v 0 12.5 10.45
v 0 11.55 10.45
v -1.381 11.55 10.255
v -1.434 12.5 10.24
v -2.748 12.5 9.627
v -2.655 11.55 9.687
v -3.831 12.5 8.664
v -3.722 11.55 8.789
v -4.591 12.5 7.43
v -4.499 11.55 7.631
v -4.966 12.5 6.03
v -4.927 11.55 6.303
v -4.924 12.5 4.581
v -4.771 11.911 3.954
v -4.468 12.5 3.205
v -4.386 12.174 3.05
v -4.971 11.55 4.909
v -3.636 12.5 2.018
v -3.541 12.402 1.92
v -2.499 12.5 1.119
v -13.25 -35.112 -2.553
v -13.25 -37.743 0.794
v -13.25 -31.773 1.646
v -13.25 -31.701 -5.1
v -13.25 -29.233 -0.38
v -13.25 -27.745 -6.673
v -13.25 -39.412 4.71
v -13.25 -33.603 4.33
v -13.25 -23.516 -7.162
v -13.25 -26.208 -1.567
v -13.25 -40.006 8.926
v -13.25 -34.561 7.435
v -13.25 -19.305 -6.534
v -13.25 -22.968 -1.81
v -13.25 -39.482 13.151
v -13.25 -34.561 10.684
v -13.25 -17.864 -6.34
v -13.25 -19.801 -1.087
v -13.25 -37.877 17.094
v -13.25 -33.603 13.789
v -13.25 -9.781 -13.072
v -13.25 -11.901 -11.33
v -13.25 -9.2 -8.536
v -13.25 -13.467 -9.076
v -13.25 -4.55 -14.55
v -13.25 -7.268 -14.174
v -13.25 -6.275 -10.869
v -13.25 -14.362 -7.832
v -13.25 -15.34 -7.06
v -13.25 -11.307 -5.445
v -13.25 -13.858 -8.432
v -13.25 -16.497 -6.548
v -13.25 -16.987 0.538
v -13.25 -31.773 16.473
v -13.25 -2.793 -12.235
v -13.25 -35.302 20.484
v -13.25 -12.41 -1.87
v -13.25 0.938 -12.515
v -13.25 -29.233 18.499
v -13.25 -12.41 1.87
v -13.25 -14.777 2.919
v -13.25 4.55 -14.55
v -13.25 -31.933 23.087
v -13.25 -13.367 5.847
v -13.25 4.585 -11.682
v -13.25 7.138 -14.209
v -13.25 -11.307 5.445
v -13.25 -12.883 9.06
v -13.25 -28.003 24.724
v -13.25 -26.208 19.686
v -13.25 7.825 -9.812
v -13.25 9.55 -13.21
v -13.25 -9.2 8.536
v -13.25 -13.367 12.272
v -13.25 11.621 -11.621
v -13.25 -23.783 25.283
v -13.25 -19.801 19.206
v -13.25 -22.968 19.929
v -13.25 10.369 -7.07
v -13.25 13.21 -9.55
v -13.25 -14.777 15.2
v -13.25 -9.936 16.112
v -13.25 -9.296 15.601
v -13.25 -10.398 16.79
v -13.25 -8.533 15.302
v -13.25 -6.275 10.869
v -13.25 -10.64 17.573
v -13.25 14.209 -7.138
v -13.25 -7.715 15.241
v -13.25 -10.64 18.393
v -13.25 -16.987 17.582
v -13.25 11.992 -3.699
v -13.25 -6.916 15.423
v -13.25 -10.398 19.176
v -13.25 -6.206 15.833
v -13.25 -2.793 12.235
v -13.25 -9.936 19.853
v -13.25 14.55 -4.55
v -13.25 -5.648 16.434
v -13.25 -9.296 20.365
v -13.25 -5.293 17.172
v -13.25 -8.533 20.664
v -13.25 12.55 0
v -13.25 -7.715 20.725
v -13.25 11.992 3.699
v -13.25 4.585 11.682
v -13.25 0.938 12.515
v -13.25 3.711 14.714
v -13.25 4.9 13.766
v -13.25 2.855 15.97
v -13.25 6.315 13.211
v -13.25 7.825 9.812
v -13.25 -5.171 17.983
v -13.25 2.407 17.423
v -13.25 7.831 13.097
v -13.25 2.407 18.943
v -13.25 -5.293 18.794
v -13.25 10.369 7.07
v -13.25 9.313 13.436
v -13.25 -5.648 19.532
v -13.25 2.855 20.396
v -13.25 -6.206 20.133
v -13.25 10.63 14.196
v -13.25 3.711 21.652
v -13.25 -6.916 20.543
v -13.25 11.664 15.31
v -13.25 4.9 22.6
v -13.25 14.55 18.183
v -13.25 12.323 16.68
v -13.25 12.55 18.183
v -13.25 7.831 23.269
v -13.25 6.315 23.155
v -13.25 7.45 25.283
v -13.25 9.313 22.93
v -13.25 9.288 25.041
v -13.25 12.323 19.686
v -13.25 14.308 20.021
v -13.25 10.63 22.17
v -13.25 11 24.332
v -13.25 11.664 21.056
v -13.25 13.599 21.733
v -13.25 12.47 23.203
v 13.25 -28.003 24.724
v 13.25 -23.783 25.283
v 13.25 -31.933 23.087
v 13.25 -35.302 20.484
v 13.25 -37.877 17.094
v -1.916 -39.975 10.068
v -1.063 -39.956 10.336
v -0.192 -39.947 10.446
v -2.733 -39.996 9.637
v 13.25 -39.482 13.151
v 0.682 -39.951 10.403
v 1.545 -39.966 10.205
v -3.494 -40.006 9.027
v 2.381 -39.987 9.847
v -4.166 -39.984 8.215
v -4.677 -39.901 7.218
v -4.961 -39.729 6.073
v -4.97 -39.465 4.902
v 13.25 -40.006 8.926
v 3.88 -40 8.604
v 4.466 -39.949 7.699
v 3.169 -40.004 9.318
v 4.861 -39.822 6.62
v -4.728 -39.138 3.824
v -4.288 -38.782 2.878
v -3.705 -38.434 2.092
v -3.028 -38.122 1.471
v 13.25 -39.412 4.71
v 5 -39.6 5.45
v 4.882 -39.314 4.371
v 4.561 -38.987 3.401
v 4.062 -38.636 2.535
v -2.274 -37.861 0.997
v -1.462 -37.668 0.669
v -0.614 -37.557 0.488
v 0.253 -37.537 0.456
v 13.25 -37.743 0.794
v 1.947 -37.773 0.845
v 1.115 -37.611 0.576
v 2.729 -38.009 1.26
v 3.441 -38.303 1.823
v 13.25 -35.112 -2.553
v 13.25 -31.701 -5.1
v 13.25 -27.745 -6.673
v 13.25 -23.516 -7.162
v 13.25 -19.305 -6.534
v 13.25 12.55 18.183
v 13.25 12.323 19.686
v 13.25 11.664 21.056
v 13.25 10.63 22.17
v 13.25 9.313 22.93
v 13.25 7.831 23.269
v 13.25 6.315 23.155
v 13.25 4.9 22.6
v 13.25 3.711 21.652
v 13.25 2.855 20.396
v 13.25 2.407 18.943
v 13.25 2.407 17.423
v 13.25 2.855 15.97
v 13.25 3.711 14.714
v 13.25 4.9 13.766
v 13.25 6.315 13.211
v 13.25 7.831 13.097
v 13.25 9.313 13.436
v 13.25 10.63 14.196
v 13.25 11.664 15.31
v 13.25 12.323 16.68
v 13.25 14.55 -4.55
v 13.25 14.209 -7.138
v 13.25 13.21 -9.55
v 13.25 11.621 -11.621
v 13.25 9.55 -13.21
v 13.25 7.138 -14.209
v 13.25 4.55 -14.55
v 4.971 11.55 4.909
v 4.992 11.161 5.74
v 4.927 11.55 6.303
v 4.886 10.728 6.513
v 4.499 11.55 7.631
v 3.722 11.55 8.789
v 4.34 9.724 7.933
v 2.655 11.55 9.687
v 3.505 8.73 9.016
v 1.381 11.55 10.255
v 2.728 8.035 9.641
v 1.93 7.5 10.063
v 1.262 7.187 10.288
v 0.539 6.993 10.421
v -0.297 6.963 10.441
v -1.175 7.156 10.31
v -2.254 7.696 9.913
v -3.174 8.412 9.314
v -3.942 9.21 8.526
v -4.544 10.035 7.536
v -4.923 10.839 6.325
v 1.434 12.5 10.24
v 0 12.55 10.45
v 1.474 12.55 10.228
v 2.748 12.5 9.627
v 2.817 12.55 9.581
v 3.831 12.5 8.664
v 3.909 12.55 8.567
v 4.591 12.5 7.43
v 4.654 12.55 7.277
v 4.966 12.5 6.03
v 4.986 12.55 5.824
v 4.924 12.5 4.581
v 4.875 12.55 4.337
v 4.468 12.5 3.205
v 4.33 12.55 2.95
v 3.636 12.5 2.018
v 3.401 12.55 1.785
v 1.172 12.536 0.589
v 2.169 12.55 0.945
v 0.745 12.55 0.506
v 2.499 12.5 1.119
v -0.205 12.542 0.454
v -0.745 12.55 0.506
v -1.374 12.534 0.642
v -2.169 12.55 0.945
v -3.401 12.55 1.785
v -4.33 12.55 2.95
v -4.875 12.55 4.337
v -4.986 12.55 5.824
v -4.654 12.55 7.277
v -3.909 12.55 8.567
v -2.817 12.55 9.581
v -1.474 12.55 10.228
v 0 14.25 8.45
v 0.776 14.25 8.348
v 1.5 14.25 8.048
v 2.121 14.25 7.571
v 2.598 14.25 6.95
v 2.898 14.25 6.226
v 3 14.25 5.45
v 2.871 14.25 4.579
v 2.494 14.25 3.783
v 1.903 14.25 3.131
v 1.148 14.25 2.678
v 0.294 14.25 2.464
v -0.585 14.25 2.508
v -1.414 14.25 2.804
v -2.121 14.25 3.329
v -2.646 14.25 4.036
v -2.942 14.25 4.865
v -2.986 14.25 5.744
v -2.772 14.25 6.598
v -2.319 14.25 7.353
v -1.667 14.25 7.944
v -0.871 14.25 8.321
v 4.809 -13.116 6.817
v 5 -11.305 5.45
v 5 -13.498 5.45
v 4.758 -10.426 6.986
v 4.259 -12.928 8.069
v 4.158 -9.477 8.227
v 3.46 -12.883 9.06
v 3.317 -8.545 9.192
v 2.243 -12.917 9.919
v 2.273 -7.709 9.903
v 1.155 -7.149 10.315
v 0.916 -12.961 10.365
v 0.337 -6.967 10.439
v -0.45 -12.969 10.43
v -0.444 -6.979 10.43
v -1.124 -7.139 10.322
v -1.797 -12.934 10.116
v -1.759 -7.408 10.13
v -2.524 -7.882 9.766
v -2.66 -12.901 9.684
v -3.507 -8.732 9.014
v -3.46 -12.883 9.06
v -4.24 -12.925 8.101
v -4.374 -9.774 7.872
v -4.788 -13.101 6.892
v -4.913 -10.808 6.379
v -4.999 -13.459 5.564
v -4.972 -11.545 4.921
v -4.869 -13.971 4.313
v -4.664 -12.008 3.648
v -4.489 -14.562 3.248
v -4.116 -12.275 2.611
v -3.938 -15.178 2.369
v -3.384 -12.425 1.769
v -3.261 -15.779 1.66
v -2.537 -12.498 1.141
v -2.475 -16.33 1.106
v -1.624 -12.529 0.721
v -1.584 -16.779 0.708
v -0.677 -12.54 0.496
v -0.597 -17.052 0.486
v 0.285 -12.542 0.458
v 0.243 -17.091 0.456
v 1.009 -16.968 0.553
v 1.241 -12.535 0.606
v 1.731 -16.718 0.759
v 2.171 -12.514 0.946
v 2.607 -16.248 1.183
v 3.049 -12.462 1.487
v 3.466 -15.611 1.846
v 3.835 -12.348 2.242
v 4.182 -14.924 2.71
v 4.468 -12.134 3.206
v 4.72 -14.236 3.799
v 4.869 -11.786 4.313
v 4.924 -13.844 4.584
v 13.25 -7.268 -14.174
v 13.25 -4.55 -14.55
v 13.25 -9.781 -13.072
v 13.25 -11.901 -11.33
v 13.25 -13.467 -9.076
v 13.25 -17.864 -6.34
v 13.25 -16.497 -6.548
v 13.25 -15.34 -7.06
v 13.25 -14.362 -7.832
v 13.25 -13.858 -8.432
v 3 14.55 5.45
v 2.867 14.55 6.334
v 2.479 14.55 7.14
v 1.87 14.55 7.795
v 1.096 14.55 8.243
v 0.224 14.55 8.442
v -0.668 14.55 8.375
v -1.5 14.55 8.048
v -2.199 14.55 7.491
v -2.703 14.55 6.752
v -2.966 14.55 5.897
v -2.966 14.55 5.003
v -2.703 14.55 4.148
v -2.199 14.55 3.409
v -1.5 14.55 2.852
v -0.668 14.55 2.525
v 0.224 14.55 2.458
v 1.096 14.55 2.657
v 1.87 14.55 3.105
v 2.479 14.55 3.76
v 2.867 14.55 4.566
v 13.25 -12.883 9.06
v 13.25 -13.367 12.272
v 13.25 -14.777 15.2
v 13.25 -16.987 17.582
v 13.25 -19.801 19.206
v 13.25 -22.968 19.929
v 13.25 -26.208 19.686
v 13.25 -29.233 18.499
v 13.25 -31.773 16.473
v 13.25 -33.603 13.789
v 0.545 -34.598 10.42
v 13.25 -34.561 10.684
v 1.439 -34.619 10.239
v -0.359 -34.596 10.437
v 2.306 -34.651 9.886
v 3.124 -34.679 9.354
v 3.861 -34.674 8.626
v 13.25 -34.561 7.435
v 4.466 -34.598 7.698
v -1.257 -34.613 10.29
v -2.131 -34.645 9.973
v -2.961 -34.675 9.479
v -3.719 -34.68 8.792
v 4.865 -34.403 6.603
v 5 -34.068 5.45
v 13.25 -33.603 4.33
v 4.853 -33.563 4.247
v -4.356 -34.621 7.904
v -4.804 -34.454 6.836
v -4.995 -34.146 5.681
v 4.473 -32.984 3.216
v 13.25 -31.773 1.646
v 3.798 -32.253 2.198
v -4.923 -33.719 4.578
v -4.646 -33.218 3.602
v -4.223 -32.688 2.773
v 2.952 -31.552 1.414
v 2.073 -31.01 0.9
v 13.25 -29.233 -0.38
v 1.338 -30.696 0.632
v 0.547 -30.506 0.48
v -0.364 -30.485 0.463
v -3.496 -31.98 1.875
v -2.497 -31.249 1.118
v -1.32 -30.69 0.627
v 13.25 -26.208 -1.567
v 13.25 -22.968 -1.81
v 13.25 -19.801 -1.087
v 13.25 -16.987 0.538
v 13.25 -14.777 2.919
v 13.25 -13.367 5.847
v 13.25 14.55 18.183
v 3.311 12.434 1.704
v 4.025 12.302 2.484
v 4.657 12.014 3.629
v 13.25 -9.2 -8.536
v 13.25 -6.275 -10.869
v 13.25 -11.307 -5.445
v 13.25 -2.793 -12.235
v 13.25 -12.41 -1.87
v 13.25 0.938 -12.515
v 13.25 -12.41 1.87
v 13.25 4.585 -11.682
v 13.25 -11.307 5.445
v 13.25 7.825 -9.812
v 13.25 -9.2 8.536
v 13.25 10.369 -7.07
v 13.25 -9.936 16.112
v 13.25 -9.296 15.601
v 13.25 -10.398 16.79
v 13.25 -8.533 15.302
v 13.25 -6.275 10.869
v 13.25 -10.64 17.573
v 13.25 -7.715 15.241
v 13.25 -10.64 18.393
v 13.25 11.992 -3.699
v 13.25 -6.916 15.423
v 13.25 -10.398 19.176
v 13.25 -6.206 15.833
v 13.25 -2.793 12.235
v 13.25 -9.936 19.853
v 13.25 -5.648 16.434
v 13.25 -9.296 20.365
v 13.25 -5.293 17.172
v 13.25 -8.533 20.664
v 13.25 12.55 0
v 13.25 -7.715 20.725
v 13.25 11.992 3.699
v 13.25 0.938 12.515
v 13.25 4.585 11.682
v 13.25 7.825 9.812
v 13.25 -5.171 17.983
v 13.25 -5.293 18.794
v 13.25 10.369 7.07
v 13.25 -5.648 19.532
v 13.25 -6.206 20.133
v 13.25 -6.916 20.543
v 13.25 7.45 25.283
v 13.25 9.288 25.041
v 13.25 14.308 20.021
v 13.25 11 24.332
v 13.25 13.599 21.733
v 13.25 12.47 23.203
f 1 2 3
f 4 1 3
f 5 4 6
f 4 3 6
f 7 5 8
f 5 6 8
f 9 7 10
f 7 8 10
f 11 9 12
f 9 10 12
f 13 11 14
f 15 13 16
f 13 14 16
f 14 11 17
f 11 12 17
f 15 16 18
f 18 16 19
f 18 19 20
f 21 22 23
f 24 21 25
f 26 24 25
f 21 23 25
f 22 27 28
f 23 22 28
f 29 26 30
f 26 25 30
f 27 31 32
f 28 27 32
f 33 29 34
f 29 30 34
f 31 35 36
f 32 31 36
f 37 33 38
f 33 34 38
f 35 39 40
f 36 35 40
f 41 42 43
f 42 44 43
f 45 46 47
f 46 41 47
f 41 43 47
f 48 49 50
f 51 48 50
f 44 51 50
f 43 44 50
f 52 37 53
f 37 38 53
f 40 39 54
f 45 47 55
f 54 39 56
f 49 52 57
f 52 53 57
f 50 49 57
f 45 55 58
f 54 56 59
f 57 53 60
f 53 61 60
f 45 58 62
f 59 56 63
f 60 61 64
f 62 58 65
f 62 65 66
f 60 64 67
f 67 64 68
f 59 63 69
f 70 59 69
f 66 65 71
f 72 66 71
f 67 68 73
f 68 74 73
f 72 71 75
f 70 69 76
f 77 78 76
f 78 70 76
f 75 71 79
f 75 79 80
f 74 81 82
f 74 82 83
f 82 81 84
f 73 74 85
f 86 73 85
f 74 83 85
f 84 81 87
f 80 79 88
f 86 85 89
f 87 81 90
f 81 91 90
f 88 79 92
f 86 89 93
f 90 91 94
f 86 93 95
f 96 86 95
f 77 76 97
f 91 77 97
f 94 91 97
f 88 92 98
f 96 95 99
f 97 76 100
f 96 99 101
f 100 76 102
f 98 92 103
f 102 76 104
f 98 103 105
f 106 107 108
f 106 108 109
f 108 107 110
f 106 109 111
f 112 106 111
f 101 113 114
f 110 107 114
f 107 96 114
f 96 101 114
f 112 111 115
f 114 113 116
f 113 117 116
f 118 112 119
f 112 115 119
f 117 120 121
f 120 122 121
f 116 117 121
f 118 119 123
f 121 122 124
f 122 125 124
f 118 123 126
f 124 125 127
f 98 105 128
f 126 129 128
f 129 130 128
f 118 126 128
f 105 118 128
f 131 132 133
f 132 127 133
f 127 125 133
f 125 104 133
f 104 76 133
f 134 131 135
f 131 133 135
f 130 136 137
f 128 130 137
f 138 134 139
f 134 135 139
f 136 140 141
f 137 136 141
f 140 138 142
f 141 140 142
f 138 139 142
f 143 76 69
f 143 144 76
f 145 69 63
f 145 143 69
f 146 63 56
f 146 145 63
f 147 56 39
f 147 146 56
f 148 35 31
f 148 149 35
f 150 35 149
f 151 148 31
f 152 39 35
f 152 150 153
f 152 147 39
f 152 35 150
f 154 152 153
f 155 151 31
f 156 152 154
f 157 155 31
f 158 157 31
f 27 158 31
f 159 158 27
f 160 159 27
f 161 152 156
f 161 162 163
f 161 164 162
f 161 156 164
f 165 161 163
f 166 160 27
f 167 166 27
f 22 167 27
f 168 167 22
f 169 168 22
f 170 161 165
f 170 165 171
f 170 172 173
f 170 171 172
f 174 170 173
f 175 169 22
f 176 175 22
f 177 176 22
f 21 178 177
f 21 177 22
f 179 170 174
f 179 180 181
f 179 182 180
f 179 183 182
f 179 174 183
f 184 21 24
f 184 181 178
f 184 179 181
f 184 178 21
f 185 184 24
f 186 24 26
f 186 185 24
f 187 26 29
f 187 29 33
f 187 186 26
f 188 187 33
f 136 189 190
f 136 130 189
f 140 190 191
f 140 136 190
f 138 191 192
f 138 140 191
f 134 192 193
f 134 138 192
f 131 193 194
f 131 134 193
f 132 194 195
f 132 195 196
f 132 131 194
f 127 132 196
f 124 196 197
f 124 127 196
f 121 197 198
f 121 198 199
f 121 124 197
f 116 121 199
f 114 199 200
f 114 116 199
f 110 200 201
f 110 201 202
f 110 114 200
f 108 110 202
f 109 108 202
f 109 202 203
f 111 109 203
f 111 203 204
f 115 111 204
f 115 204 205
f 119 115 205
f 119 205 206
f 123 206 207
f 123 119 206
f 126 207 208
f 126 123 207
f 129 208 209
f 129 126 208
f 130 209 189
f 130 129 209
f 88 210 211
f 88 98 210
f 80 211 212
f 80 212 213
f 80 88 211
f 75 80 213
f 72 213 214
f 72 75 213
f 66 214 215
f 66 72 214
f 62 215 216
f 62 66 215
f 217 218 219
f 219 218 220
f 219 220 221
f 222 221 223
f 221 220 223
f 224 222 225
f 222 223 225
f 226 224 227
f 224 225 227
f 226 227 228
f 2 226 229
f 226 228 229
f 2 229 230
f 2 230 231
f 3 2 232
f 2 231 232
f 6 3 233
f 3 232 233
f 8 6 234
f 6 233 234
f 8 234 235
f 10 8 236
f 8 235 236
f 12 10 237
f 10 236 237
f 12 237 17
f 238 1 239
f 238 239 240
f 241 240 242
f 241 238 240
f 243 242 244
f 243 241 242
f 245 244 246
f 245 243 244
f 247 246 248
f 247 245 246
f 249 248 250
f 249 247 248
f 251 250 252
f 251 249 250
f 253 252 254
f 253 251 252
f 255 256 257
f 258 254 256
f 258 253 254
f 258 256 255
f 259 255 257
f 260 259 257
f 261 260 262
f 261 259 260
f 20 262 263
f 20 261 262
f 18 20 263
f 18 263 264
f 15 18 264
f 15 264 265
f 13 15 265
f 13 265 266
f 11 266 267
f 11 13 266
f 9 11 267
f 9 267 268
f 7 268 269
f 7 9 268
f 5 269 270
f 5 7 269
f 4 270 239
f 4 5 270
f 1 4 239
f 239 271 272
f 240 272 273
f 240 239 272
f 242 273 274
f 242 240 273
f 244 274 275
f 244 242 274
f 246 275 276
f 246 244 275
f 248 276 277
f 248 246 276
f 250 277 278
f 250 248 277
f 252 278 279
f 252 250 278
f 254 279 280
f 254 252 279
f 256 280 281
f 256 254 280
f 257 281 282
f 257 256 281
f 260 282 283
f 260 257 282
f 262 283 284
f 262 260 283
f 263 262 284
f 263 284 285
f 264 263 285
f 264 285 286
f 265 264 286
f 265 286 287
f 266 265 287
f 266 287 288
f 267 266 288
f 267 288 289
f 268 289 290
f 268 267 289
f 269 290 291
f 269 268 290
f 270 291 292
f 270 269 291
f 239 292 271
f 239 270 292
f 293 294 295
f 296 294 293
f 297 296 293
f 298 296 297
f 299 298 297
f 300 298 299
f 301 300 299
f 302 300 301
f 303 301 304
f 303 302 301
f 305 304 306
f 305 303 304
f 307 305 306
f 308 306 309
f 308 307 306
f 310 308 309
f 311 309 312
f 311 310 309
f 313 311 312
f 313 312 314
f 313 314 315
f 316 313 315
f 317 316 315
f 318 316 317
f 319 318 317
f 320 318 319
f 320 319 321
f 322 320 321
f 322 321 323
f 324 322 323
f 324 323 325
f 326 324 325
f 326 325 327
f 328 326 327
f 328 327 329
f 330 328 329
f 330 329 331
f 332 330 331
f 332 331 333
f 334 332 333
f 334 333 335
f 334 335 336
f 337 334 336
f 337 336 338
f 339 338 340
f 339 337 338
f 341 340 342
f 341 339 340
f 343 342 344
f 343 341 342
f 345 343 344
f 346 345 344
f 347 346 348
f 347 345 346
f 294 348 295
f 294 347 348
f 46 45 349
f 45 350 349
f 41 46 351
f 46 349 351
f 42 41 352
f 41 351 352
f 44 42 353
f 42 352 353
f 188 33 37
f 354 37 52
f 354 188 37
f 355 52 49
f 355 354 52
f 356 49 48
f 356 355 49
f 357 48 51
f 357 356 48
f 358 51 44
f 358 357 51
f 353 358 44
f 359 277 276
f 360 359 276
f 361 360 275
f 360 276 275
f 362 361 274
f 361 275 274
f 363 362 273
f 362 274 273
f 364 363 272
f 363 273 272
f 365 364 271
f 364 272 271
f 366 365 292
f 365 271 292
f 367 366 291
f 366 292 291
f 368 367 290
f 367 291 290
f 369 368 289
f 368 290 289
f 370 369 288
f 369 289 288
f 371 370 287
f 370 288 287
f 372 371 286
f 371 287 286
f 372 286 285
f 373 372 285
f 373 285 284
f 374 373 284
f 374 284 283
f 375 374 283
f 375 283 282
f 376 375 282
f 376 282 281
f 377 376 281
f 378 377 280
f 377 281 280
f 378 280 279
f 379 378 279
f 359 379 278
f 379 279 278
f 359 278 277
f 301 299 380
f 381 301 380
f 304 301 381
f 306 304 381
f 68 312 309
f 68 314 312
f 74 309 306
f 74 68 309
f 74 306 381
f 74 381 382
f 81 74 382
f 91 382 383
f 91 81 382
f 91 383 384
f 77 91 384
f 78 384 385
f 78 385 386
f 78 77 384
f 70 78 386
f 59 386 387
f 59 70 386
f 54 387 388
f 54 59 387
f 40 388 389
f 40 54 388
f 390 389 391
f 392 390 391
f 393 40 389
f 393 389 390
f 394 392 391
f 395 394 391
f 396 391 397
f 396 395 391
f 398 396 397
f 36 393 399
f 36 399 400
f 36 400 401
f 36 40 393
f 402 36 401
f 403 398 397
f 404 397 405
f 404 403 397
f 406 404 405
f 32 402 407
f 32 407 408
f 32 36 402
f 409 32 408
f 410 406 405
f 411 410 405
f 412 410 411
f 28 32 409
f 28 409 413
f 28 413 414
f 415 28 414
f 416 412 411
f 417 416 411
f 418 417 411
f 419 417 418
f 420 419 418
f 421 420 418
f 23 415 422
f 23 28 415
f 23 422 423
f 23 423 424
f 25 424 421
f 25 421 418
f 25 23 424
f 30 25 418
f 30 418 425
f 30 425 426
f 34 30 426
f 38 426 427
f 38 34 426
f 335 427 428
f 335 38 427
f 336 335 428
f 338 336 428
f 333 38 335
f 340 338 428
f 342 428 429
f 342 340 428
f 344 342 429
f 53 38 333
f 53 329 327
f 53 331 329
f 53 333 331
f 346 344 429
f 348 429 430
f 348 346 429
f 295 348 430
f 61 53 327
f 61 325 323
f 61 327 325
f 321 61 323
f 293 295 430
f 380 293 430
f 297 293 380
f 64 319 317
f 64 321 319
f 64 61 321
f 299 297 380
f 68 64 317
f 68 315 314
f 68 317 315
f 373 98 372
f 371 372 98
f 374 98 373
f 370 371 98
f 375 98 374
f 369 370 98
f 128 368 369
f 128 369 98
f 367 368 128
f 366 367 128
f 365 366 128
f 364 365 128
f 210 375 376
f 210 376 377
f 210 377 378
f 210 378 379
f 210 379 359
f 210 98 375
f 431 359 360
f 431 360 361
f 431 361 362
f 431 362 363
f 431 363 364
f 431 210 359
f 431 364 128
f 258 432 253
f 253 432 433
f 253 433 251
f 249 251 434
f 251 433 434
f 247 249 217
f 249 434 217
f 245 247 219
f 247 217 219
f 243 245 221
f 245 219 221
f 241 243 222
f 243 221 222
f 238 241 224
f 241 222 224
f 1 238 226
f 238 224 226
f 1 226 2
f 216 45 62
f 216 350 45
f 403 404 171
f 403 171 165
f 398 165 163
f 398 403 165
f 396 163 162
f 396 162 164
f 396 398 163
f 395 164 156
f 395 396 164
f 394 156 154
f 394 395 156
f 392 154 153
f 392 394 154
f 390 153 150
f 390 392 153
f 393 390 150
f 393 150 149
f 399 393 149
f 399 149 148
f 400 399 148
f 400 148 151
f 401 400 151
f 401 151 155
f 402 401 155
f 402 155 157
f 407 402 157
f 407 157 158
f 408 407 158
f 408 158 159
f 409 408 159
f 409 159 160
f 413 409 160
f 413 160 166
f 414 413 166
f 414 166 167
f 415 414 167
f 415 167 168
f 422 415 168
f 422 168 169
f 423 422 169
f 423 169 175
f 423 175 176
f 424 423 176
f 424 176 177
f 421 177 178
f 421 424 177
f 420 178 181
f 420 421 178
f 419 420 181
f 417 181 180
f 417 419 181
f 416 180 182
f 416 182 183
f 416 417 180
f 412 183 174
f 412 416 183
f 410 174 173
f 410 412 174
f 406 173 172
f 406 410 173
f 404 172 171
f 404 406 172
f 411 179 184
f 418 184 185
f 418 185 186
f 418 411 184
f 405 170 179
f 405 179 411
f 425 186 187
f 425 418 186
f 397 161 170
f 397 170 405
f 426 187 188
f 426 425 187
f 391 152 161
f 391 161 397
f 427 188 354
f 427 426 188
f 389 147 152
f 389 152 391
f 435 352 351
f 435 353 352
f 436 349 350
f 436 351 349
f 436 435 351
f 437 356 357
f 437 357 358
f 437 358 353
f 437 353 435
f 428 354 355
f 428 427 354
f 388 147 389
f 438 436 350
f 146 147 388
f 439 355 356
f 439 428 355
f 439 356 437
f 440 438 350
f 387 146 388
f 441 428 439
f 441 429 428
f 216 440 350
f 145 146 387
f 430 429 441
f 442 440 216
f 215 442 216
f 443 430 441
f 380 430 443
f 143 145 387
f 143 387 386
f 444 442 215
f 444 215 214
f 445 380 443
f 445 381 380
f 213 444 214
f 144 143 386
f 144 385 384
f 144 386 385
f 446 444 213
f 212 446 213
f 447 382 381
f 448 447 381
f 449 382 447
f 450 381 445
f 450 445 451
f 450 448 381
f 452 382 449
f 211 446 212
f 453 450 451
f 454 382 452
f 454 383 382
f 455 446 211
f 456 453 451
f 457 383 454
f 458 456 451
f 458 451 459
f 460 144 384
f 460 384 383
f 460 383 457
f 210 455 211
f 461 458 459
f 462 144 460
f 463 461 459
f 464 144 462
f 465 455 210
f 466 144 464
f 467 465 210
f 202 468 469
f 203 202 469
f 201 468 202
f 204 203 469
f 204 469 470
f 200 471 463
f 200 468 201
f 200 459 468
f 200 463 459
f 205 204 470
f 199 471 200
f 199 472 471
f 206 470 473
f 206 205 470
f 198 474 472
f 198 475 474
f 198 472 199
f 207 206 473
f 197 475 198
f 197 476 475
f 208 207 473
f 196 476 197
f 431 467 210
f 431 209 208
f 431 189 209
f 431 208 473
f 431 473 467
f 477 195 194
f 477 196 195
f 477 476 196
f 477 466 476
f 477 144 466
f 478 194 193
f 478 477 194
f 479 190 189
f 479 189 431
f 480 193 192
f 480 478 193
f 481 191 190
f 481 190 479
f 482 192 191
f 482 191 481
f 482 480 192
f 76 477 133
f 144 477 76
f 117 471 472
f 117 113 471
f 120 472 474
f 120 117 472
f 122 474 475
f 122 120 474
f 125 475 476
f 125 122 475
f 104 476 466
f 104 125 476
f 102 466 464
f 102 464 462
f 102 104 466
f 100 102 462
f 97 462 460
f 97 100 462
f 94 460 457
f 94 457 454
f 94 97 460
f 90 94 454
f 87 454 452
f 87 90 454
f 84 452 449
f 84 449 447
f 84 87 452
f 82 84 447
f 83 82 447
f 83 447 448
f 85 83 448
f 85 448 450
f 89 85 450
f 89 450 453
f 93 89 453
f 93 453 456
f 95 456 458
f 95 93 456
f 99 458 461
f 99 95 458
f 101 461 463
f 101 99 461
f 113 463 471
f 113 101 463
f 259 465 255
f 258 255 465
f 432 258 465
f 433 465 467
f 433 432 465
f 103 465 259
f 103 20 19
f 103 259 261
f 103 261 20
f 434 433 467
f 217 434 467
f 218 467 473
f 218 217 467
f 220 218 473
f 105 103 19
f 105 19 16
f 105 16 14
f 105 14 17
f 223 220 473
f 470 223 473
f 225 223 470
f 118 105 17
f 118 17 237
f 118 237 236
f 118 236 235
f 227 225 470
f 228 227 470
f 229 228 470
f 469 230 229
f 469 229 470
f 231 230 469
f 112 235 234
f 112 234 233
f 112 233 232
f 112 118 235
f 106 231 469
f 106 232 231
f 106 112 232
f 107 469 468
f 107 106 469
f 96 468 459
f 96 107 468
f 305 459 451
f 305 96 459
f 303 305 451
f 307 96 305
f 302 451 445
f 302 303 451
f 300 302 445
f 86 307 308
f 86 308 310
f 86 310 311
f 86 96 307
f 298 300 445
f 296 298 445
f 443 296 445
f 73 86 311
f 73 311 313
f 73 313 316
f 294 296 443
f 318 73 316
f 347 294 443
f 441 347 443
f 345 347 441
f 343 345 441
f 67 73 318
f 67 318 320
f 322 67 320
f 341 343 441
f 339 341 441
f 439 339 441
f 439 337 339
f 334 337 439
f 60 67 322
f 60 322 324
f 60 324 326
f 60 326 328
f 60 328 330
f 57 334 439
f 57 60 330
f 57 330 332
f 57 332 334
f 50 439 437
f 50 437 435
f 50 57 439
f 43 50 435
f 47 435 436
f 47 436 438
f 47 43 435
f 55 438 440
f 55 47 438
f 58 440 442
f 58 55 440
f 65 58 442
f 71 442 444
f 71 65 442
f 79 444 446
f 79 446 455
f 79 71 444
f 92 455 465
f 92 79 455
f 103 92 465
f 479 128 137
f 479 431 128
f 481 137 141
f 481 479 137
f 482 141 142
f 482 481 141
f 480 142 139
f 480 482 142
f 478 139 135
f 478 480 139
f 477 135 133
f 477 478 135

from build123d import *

# Parameters (mm, degrees)
F0_R          = 12.55
F0_R_2        = 10.9
F0_R_3        = 2.75
F0_R_4        = 5.1
F1_DEPTH      = 13.25
F2_R          = 10
F3_R          = 5
F4_R          = 3
F5_DEPTH      = 14.5510001
F5_DEPTH_BACK = 40.0072913958
F4_R_2        = 5
F6_DEPTH      = 12.5
F6_DEPTH_BACK = 40.0072913958


with BuildPart() as f1:
    # F0 (on Right) → F1 (new body, symmetric)
    with BuildSketch(Plane.YZ):
        with BuildLine():
            Line((7.45, 25.2829590551), (-23.7829060836, 25.2829590551))
            ThreePointArc((-23.7829060836, 25.2829590551), (-39.2686382031, 4.2232189691), (-14.55, -4.280278967))
            Line((-14.55, -4.280278967), (-14.55, -14.55))
            Line((-14.55, -14.55), (14.55, -14.55))
            Line((14.55, -14.55), (14.55, 18.1829590551))
            ThreePointArc((14.55, 18.1829590551), (12.4704581464, 23.2034172015), (7.45, 25.2829590551))
        make_face()
        Circle(F0_R, mode=Mode.SUBTRACT)
        with Locations((-23.7829060836, 9.059573843)):
            Circle(F0_R_2, mode=Mode.SUBTRACT)
        with Locations((-7.9205860656, 17.9829590551)):
            Circle(F0_R_3, mode=Mode.SUBTRACT)
        with Locations((7.45, 18.1829590551)):
            Circle(F0_R_4, mode=Mode.SUBTRACT)
    extrude(amount=F1_DEPTH, both=True)

    # F2
    f2_edges = [f1.edges().sort_by_distance(p)[0] for p in [
        (0, -23.782906, 25.282959),
        (0, 14.55, 18.182959),
        (0, 7.45, 25.282959),
        (0, -14.55, -14.55),
        (0, 14.55, -14.55),
    ]]
    fillet(f2_edges, radius=F2_R)

    # F3
    f3_edges = [f1.edges().sort_by_distance(p)[0] for p in [
        (0, -14.55, -4.280279),
    ]]
    fillet(f3_edges, radius=F3_R)

    # F4 (on Front) → F5 (cut, two sides)
    with BuildSketch(Plane.XZ) as f5_sk:
        with Locations((0, 5.45)):
            Circle(F4_R)
    extrude(amount=-F5_DEPTH, mode=Mode.SUBTRACT)
    extrude(f5_sk.sketch, amount=F5_DEPTH_BACK, mode=Mode.SUBTRACT)

    # F4 (on Front) → F6 (cut, two sides)
    with BuildSketch(Plane.XZ) as f6_sk:
        with Locations((0, 5.45)):
            Circle(F4_R_2)
        with Locations((0, 5.45)):
            Circle(F4_R, mode=Mode.SUBTRACT)
    extrude(amount=-F6_DEPTH, mode=Mode.SUBTRACT)
    extrude(f6_sk.sketch, amount=F6_DEPTH_BACK, mode=Mode.SUBTRACT)

    # F7 (on Right) → F8 (revolve, cut)
    with BuildSketch(Plane.YZ):
        Polygon((14.55, 5.45), (14.55, 8.45), (14.25, 8.45), (12.55, 10.45), (11.55, 10.45), (11.55, 5.45), align=None)
    revolve(axis=Axis((0, 7.275, 5.45), (0, 1, 0)), mode=Mode.SUBTRACT)


solid = f1.part
